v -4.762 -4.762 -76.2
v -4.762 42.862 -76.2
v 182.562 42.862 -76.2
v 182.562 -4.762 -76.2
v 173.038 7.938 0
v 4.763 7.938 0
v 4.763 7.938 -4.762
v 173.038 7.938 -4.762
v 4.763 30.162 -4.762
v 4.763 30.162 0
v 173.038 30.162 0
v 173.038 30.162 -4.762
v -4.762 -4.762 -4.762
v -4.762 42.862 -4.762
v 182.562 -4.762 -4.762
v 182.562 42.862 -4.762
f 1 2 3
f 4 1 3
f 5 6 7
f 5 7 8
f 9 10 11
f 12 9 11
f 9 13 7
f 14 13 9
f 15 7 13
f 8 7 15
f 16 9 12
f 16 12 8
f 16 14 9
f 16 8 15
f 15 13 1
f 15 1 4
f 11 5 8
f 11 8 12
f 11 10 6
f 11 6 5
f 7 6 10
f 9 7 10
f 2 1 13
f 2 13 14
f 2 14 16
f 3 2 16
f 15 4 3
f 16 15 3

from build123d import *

# Parameters (mm, degrees)
F0_W     = 187.325
F0_H     = 47.625
F1_DEPTH = 76.2
F2_W     = 187.325
F2_H     = 47.625
F2_W_2   = 168.275
F2_H_2   = 22.225
F3_DEPTH = 4.7625


with BuildPart() as f1:
    # F0 (on Top) → F1 (new body)
    with BuildSketch(Plane.XY):
        with Locations((88.9, 19.05)):
            Rectangle(F0_W, F0_H)
    extrude(amount=-F1_DEPTH)

    # F2 (on face) → F3 (cut)
    with BuildSketch(Plane.XY):
        with Locations((88.9, 19.05)):
            Rectangle(F2_W, F2_H)
        with Locations((88.9, 19.05)):
            Rectangle(F2_W_2, F2_H_2, mode=Mode.SUBTRACT)
    extrude(amount=-F3_DEPTH, mode=Mode.SUBTRACT)


solid = f1.part
